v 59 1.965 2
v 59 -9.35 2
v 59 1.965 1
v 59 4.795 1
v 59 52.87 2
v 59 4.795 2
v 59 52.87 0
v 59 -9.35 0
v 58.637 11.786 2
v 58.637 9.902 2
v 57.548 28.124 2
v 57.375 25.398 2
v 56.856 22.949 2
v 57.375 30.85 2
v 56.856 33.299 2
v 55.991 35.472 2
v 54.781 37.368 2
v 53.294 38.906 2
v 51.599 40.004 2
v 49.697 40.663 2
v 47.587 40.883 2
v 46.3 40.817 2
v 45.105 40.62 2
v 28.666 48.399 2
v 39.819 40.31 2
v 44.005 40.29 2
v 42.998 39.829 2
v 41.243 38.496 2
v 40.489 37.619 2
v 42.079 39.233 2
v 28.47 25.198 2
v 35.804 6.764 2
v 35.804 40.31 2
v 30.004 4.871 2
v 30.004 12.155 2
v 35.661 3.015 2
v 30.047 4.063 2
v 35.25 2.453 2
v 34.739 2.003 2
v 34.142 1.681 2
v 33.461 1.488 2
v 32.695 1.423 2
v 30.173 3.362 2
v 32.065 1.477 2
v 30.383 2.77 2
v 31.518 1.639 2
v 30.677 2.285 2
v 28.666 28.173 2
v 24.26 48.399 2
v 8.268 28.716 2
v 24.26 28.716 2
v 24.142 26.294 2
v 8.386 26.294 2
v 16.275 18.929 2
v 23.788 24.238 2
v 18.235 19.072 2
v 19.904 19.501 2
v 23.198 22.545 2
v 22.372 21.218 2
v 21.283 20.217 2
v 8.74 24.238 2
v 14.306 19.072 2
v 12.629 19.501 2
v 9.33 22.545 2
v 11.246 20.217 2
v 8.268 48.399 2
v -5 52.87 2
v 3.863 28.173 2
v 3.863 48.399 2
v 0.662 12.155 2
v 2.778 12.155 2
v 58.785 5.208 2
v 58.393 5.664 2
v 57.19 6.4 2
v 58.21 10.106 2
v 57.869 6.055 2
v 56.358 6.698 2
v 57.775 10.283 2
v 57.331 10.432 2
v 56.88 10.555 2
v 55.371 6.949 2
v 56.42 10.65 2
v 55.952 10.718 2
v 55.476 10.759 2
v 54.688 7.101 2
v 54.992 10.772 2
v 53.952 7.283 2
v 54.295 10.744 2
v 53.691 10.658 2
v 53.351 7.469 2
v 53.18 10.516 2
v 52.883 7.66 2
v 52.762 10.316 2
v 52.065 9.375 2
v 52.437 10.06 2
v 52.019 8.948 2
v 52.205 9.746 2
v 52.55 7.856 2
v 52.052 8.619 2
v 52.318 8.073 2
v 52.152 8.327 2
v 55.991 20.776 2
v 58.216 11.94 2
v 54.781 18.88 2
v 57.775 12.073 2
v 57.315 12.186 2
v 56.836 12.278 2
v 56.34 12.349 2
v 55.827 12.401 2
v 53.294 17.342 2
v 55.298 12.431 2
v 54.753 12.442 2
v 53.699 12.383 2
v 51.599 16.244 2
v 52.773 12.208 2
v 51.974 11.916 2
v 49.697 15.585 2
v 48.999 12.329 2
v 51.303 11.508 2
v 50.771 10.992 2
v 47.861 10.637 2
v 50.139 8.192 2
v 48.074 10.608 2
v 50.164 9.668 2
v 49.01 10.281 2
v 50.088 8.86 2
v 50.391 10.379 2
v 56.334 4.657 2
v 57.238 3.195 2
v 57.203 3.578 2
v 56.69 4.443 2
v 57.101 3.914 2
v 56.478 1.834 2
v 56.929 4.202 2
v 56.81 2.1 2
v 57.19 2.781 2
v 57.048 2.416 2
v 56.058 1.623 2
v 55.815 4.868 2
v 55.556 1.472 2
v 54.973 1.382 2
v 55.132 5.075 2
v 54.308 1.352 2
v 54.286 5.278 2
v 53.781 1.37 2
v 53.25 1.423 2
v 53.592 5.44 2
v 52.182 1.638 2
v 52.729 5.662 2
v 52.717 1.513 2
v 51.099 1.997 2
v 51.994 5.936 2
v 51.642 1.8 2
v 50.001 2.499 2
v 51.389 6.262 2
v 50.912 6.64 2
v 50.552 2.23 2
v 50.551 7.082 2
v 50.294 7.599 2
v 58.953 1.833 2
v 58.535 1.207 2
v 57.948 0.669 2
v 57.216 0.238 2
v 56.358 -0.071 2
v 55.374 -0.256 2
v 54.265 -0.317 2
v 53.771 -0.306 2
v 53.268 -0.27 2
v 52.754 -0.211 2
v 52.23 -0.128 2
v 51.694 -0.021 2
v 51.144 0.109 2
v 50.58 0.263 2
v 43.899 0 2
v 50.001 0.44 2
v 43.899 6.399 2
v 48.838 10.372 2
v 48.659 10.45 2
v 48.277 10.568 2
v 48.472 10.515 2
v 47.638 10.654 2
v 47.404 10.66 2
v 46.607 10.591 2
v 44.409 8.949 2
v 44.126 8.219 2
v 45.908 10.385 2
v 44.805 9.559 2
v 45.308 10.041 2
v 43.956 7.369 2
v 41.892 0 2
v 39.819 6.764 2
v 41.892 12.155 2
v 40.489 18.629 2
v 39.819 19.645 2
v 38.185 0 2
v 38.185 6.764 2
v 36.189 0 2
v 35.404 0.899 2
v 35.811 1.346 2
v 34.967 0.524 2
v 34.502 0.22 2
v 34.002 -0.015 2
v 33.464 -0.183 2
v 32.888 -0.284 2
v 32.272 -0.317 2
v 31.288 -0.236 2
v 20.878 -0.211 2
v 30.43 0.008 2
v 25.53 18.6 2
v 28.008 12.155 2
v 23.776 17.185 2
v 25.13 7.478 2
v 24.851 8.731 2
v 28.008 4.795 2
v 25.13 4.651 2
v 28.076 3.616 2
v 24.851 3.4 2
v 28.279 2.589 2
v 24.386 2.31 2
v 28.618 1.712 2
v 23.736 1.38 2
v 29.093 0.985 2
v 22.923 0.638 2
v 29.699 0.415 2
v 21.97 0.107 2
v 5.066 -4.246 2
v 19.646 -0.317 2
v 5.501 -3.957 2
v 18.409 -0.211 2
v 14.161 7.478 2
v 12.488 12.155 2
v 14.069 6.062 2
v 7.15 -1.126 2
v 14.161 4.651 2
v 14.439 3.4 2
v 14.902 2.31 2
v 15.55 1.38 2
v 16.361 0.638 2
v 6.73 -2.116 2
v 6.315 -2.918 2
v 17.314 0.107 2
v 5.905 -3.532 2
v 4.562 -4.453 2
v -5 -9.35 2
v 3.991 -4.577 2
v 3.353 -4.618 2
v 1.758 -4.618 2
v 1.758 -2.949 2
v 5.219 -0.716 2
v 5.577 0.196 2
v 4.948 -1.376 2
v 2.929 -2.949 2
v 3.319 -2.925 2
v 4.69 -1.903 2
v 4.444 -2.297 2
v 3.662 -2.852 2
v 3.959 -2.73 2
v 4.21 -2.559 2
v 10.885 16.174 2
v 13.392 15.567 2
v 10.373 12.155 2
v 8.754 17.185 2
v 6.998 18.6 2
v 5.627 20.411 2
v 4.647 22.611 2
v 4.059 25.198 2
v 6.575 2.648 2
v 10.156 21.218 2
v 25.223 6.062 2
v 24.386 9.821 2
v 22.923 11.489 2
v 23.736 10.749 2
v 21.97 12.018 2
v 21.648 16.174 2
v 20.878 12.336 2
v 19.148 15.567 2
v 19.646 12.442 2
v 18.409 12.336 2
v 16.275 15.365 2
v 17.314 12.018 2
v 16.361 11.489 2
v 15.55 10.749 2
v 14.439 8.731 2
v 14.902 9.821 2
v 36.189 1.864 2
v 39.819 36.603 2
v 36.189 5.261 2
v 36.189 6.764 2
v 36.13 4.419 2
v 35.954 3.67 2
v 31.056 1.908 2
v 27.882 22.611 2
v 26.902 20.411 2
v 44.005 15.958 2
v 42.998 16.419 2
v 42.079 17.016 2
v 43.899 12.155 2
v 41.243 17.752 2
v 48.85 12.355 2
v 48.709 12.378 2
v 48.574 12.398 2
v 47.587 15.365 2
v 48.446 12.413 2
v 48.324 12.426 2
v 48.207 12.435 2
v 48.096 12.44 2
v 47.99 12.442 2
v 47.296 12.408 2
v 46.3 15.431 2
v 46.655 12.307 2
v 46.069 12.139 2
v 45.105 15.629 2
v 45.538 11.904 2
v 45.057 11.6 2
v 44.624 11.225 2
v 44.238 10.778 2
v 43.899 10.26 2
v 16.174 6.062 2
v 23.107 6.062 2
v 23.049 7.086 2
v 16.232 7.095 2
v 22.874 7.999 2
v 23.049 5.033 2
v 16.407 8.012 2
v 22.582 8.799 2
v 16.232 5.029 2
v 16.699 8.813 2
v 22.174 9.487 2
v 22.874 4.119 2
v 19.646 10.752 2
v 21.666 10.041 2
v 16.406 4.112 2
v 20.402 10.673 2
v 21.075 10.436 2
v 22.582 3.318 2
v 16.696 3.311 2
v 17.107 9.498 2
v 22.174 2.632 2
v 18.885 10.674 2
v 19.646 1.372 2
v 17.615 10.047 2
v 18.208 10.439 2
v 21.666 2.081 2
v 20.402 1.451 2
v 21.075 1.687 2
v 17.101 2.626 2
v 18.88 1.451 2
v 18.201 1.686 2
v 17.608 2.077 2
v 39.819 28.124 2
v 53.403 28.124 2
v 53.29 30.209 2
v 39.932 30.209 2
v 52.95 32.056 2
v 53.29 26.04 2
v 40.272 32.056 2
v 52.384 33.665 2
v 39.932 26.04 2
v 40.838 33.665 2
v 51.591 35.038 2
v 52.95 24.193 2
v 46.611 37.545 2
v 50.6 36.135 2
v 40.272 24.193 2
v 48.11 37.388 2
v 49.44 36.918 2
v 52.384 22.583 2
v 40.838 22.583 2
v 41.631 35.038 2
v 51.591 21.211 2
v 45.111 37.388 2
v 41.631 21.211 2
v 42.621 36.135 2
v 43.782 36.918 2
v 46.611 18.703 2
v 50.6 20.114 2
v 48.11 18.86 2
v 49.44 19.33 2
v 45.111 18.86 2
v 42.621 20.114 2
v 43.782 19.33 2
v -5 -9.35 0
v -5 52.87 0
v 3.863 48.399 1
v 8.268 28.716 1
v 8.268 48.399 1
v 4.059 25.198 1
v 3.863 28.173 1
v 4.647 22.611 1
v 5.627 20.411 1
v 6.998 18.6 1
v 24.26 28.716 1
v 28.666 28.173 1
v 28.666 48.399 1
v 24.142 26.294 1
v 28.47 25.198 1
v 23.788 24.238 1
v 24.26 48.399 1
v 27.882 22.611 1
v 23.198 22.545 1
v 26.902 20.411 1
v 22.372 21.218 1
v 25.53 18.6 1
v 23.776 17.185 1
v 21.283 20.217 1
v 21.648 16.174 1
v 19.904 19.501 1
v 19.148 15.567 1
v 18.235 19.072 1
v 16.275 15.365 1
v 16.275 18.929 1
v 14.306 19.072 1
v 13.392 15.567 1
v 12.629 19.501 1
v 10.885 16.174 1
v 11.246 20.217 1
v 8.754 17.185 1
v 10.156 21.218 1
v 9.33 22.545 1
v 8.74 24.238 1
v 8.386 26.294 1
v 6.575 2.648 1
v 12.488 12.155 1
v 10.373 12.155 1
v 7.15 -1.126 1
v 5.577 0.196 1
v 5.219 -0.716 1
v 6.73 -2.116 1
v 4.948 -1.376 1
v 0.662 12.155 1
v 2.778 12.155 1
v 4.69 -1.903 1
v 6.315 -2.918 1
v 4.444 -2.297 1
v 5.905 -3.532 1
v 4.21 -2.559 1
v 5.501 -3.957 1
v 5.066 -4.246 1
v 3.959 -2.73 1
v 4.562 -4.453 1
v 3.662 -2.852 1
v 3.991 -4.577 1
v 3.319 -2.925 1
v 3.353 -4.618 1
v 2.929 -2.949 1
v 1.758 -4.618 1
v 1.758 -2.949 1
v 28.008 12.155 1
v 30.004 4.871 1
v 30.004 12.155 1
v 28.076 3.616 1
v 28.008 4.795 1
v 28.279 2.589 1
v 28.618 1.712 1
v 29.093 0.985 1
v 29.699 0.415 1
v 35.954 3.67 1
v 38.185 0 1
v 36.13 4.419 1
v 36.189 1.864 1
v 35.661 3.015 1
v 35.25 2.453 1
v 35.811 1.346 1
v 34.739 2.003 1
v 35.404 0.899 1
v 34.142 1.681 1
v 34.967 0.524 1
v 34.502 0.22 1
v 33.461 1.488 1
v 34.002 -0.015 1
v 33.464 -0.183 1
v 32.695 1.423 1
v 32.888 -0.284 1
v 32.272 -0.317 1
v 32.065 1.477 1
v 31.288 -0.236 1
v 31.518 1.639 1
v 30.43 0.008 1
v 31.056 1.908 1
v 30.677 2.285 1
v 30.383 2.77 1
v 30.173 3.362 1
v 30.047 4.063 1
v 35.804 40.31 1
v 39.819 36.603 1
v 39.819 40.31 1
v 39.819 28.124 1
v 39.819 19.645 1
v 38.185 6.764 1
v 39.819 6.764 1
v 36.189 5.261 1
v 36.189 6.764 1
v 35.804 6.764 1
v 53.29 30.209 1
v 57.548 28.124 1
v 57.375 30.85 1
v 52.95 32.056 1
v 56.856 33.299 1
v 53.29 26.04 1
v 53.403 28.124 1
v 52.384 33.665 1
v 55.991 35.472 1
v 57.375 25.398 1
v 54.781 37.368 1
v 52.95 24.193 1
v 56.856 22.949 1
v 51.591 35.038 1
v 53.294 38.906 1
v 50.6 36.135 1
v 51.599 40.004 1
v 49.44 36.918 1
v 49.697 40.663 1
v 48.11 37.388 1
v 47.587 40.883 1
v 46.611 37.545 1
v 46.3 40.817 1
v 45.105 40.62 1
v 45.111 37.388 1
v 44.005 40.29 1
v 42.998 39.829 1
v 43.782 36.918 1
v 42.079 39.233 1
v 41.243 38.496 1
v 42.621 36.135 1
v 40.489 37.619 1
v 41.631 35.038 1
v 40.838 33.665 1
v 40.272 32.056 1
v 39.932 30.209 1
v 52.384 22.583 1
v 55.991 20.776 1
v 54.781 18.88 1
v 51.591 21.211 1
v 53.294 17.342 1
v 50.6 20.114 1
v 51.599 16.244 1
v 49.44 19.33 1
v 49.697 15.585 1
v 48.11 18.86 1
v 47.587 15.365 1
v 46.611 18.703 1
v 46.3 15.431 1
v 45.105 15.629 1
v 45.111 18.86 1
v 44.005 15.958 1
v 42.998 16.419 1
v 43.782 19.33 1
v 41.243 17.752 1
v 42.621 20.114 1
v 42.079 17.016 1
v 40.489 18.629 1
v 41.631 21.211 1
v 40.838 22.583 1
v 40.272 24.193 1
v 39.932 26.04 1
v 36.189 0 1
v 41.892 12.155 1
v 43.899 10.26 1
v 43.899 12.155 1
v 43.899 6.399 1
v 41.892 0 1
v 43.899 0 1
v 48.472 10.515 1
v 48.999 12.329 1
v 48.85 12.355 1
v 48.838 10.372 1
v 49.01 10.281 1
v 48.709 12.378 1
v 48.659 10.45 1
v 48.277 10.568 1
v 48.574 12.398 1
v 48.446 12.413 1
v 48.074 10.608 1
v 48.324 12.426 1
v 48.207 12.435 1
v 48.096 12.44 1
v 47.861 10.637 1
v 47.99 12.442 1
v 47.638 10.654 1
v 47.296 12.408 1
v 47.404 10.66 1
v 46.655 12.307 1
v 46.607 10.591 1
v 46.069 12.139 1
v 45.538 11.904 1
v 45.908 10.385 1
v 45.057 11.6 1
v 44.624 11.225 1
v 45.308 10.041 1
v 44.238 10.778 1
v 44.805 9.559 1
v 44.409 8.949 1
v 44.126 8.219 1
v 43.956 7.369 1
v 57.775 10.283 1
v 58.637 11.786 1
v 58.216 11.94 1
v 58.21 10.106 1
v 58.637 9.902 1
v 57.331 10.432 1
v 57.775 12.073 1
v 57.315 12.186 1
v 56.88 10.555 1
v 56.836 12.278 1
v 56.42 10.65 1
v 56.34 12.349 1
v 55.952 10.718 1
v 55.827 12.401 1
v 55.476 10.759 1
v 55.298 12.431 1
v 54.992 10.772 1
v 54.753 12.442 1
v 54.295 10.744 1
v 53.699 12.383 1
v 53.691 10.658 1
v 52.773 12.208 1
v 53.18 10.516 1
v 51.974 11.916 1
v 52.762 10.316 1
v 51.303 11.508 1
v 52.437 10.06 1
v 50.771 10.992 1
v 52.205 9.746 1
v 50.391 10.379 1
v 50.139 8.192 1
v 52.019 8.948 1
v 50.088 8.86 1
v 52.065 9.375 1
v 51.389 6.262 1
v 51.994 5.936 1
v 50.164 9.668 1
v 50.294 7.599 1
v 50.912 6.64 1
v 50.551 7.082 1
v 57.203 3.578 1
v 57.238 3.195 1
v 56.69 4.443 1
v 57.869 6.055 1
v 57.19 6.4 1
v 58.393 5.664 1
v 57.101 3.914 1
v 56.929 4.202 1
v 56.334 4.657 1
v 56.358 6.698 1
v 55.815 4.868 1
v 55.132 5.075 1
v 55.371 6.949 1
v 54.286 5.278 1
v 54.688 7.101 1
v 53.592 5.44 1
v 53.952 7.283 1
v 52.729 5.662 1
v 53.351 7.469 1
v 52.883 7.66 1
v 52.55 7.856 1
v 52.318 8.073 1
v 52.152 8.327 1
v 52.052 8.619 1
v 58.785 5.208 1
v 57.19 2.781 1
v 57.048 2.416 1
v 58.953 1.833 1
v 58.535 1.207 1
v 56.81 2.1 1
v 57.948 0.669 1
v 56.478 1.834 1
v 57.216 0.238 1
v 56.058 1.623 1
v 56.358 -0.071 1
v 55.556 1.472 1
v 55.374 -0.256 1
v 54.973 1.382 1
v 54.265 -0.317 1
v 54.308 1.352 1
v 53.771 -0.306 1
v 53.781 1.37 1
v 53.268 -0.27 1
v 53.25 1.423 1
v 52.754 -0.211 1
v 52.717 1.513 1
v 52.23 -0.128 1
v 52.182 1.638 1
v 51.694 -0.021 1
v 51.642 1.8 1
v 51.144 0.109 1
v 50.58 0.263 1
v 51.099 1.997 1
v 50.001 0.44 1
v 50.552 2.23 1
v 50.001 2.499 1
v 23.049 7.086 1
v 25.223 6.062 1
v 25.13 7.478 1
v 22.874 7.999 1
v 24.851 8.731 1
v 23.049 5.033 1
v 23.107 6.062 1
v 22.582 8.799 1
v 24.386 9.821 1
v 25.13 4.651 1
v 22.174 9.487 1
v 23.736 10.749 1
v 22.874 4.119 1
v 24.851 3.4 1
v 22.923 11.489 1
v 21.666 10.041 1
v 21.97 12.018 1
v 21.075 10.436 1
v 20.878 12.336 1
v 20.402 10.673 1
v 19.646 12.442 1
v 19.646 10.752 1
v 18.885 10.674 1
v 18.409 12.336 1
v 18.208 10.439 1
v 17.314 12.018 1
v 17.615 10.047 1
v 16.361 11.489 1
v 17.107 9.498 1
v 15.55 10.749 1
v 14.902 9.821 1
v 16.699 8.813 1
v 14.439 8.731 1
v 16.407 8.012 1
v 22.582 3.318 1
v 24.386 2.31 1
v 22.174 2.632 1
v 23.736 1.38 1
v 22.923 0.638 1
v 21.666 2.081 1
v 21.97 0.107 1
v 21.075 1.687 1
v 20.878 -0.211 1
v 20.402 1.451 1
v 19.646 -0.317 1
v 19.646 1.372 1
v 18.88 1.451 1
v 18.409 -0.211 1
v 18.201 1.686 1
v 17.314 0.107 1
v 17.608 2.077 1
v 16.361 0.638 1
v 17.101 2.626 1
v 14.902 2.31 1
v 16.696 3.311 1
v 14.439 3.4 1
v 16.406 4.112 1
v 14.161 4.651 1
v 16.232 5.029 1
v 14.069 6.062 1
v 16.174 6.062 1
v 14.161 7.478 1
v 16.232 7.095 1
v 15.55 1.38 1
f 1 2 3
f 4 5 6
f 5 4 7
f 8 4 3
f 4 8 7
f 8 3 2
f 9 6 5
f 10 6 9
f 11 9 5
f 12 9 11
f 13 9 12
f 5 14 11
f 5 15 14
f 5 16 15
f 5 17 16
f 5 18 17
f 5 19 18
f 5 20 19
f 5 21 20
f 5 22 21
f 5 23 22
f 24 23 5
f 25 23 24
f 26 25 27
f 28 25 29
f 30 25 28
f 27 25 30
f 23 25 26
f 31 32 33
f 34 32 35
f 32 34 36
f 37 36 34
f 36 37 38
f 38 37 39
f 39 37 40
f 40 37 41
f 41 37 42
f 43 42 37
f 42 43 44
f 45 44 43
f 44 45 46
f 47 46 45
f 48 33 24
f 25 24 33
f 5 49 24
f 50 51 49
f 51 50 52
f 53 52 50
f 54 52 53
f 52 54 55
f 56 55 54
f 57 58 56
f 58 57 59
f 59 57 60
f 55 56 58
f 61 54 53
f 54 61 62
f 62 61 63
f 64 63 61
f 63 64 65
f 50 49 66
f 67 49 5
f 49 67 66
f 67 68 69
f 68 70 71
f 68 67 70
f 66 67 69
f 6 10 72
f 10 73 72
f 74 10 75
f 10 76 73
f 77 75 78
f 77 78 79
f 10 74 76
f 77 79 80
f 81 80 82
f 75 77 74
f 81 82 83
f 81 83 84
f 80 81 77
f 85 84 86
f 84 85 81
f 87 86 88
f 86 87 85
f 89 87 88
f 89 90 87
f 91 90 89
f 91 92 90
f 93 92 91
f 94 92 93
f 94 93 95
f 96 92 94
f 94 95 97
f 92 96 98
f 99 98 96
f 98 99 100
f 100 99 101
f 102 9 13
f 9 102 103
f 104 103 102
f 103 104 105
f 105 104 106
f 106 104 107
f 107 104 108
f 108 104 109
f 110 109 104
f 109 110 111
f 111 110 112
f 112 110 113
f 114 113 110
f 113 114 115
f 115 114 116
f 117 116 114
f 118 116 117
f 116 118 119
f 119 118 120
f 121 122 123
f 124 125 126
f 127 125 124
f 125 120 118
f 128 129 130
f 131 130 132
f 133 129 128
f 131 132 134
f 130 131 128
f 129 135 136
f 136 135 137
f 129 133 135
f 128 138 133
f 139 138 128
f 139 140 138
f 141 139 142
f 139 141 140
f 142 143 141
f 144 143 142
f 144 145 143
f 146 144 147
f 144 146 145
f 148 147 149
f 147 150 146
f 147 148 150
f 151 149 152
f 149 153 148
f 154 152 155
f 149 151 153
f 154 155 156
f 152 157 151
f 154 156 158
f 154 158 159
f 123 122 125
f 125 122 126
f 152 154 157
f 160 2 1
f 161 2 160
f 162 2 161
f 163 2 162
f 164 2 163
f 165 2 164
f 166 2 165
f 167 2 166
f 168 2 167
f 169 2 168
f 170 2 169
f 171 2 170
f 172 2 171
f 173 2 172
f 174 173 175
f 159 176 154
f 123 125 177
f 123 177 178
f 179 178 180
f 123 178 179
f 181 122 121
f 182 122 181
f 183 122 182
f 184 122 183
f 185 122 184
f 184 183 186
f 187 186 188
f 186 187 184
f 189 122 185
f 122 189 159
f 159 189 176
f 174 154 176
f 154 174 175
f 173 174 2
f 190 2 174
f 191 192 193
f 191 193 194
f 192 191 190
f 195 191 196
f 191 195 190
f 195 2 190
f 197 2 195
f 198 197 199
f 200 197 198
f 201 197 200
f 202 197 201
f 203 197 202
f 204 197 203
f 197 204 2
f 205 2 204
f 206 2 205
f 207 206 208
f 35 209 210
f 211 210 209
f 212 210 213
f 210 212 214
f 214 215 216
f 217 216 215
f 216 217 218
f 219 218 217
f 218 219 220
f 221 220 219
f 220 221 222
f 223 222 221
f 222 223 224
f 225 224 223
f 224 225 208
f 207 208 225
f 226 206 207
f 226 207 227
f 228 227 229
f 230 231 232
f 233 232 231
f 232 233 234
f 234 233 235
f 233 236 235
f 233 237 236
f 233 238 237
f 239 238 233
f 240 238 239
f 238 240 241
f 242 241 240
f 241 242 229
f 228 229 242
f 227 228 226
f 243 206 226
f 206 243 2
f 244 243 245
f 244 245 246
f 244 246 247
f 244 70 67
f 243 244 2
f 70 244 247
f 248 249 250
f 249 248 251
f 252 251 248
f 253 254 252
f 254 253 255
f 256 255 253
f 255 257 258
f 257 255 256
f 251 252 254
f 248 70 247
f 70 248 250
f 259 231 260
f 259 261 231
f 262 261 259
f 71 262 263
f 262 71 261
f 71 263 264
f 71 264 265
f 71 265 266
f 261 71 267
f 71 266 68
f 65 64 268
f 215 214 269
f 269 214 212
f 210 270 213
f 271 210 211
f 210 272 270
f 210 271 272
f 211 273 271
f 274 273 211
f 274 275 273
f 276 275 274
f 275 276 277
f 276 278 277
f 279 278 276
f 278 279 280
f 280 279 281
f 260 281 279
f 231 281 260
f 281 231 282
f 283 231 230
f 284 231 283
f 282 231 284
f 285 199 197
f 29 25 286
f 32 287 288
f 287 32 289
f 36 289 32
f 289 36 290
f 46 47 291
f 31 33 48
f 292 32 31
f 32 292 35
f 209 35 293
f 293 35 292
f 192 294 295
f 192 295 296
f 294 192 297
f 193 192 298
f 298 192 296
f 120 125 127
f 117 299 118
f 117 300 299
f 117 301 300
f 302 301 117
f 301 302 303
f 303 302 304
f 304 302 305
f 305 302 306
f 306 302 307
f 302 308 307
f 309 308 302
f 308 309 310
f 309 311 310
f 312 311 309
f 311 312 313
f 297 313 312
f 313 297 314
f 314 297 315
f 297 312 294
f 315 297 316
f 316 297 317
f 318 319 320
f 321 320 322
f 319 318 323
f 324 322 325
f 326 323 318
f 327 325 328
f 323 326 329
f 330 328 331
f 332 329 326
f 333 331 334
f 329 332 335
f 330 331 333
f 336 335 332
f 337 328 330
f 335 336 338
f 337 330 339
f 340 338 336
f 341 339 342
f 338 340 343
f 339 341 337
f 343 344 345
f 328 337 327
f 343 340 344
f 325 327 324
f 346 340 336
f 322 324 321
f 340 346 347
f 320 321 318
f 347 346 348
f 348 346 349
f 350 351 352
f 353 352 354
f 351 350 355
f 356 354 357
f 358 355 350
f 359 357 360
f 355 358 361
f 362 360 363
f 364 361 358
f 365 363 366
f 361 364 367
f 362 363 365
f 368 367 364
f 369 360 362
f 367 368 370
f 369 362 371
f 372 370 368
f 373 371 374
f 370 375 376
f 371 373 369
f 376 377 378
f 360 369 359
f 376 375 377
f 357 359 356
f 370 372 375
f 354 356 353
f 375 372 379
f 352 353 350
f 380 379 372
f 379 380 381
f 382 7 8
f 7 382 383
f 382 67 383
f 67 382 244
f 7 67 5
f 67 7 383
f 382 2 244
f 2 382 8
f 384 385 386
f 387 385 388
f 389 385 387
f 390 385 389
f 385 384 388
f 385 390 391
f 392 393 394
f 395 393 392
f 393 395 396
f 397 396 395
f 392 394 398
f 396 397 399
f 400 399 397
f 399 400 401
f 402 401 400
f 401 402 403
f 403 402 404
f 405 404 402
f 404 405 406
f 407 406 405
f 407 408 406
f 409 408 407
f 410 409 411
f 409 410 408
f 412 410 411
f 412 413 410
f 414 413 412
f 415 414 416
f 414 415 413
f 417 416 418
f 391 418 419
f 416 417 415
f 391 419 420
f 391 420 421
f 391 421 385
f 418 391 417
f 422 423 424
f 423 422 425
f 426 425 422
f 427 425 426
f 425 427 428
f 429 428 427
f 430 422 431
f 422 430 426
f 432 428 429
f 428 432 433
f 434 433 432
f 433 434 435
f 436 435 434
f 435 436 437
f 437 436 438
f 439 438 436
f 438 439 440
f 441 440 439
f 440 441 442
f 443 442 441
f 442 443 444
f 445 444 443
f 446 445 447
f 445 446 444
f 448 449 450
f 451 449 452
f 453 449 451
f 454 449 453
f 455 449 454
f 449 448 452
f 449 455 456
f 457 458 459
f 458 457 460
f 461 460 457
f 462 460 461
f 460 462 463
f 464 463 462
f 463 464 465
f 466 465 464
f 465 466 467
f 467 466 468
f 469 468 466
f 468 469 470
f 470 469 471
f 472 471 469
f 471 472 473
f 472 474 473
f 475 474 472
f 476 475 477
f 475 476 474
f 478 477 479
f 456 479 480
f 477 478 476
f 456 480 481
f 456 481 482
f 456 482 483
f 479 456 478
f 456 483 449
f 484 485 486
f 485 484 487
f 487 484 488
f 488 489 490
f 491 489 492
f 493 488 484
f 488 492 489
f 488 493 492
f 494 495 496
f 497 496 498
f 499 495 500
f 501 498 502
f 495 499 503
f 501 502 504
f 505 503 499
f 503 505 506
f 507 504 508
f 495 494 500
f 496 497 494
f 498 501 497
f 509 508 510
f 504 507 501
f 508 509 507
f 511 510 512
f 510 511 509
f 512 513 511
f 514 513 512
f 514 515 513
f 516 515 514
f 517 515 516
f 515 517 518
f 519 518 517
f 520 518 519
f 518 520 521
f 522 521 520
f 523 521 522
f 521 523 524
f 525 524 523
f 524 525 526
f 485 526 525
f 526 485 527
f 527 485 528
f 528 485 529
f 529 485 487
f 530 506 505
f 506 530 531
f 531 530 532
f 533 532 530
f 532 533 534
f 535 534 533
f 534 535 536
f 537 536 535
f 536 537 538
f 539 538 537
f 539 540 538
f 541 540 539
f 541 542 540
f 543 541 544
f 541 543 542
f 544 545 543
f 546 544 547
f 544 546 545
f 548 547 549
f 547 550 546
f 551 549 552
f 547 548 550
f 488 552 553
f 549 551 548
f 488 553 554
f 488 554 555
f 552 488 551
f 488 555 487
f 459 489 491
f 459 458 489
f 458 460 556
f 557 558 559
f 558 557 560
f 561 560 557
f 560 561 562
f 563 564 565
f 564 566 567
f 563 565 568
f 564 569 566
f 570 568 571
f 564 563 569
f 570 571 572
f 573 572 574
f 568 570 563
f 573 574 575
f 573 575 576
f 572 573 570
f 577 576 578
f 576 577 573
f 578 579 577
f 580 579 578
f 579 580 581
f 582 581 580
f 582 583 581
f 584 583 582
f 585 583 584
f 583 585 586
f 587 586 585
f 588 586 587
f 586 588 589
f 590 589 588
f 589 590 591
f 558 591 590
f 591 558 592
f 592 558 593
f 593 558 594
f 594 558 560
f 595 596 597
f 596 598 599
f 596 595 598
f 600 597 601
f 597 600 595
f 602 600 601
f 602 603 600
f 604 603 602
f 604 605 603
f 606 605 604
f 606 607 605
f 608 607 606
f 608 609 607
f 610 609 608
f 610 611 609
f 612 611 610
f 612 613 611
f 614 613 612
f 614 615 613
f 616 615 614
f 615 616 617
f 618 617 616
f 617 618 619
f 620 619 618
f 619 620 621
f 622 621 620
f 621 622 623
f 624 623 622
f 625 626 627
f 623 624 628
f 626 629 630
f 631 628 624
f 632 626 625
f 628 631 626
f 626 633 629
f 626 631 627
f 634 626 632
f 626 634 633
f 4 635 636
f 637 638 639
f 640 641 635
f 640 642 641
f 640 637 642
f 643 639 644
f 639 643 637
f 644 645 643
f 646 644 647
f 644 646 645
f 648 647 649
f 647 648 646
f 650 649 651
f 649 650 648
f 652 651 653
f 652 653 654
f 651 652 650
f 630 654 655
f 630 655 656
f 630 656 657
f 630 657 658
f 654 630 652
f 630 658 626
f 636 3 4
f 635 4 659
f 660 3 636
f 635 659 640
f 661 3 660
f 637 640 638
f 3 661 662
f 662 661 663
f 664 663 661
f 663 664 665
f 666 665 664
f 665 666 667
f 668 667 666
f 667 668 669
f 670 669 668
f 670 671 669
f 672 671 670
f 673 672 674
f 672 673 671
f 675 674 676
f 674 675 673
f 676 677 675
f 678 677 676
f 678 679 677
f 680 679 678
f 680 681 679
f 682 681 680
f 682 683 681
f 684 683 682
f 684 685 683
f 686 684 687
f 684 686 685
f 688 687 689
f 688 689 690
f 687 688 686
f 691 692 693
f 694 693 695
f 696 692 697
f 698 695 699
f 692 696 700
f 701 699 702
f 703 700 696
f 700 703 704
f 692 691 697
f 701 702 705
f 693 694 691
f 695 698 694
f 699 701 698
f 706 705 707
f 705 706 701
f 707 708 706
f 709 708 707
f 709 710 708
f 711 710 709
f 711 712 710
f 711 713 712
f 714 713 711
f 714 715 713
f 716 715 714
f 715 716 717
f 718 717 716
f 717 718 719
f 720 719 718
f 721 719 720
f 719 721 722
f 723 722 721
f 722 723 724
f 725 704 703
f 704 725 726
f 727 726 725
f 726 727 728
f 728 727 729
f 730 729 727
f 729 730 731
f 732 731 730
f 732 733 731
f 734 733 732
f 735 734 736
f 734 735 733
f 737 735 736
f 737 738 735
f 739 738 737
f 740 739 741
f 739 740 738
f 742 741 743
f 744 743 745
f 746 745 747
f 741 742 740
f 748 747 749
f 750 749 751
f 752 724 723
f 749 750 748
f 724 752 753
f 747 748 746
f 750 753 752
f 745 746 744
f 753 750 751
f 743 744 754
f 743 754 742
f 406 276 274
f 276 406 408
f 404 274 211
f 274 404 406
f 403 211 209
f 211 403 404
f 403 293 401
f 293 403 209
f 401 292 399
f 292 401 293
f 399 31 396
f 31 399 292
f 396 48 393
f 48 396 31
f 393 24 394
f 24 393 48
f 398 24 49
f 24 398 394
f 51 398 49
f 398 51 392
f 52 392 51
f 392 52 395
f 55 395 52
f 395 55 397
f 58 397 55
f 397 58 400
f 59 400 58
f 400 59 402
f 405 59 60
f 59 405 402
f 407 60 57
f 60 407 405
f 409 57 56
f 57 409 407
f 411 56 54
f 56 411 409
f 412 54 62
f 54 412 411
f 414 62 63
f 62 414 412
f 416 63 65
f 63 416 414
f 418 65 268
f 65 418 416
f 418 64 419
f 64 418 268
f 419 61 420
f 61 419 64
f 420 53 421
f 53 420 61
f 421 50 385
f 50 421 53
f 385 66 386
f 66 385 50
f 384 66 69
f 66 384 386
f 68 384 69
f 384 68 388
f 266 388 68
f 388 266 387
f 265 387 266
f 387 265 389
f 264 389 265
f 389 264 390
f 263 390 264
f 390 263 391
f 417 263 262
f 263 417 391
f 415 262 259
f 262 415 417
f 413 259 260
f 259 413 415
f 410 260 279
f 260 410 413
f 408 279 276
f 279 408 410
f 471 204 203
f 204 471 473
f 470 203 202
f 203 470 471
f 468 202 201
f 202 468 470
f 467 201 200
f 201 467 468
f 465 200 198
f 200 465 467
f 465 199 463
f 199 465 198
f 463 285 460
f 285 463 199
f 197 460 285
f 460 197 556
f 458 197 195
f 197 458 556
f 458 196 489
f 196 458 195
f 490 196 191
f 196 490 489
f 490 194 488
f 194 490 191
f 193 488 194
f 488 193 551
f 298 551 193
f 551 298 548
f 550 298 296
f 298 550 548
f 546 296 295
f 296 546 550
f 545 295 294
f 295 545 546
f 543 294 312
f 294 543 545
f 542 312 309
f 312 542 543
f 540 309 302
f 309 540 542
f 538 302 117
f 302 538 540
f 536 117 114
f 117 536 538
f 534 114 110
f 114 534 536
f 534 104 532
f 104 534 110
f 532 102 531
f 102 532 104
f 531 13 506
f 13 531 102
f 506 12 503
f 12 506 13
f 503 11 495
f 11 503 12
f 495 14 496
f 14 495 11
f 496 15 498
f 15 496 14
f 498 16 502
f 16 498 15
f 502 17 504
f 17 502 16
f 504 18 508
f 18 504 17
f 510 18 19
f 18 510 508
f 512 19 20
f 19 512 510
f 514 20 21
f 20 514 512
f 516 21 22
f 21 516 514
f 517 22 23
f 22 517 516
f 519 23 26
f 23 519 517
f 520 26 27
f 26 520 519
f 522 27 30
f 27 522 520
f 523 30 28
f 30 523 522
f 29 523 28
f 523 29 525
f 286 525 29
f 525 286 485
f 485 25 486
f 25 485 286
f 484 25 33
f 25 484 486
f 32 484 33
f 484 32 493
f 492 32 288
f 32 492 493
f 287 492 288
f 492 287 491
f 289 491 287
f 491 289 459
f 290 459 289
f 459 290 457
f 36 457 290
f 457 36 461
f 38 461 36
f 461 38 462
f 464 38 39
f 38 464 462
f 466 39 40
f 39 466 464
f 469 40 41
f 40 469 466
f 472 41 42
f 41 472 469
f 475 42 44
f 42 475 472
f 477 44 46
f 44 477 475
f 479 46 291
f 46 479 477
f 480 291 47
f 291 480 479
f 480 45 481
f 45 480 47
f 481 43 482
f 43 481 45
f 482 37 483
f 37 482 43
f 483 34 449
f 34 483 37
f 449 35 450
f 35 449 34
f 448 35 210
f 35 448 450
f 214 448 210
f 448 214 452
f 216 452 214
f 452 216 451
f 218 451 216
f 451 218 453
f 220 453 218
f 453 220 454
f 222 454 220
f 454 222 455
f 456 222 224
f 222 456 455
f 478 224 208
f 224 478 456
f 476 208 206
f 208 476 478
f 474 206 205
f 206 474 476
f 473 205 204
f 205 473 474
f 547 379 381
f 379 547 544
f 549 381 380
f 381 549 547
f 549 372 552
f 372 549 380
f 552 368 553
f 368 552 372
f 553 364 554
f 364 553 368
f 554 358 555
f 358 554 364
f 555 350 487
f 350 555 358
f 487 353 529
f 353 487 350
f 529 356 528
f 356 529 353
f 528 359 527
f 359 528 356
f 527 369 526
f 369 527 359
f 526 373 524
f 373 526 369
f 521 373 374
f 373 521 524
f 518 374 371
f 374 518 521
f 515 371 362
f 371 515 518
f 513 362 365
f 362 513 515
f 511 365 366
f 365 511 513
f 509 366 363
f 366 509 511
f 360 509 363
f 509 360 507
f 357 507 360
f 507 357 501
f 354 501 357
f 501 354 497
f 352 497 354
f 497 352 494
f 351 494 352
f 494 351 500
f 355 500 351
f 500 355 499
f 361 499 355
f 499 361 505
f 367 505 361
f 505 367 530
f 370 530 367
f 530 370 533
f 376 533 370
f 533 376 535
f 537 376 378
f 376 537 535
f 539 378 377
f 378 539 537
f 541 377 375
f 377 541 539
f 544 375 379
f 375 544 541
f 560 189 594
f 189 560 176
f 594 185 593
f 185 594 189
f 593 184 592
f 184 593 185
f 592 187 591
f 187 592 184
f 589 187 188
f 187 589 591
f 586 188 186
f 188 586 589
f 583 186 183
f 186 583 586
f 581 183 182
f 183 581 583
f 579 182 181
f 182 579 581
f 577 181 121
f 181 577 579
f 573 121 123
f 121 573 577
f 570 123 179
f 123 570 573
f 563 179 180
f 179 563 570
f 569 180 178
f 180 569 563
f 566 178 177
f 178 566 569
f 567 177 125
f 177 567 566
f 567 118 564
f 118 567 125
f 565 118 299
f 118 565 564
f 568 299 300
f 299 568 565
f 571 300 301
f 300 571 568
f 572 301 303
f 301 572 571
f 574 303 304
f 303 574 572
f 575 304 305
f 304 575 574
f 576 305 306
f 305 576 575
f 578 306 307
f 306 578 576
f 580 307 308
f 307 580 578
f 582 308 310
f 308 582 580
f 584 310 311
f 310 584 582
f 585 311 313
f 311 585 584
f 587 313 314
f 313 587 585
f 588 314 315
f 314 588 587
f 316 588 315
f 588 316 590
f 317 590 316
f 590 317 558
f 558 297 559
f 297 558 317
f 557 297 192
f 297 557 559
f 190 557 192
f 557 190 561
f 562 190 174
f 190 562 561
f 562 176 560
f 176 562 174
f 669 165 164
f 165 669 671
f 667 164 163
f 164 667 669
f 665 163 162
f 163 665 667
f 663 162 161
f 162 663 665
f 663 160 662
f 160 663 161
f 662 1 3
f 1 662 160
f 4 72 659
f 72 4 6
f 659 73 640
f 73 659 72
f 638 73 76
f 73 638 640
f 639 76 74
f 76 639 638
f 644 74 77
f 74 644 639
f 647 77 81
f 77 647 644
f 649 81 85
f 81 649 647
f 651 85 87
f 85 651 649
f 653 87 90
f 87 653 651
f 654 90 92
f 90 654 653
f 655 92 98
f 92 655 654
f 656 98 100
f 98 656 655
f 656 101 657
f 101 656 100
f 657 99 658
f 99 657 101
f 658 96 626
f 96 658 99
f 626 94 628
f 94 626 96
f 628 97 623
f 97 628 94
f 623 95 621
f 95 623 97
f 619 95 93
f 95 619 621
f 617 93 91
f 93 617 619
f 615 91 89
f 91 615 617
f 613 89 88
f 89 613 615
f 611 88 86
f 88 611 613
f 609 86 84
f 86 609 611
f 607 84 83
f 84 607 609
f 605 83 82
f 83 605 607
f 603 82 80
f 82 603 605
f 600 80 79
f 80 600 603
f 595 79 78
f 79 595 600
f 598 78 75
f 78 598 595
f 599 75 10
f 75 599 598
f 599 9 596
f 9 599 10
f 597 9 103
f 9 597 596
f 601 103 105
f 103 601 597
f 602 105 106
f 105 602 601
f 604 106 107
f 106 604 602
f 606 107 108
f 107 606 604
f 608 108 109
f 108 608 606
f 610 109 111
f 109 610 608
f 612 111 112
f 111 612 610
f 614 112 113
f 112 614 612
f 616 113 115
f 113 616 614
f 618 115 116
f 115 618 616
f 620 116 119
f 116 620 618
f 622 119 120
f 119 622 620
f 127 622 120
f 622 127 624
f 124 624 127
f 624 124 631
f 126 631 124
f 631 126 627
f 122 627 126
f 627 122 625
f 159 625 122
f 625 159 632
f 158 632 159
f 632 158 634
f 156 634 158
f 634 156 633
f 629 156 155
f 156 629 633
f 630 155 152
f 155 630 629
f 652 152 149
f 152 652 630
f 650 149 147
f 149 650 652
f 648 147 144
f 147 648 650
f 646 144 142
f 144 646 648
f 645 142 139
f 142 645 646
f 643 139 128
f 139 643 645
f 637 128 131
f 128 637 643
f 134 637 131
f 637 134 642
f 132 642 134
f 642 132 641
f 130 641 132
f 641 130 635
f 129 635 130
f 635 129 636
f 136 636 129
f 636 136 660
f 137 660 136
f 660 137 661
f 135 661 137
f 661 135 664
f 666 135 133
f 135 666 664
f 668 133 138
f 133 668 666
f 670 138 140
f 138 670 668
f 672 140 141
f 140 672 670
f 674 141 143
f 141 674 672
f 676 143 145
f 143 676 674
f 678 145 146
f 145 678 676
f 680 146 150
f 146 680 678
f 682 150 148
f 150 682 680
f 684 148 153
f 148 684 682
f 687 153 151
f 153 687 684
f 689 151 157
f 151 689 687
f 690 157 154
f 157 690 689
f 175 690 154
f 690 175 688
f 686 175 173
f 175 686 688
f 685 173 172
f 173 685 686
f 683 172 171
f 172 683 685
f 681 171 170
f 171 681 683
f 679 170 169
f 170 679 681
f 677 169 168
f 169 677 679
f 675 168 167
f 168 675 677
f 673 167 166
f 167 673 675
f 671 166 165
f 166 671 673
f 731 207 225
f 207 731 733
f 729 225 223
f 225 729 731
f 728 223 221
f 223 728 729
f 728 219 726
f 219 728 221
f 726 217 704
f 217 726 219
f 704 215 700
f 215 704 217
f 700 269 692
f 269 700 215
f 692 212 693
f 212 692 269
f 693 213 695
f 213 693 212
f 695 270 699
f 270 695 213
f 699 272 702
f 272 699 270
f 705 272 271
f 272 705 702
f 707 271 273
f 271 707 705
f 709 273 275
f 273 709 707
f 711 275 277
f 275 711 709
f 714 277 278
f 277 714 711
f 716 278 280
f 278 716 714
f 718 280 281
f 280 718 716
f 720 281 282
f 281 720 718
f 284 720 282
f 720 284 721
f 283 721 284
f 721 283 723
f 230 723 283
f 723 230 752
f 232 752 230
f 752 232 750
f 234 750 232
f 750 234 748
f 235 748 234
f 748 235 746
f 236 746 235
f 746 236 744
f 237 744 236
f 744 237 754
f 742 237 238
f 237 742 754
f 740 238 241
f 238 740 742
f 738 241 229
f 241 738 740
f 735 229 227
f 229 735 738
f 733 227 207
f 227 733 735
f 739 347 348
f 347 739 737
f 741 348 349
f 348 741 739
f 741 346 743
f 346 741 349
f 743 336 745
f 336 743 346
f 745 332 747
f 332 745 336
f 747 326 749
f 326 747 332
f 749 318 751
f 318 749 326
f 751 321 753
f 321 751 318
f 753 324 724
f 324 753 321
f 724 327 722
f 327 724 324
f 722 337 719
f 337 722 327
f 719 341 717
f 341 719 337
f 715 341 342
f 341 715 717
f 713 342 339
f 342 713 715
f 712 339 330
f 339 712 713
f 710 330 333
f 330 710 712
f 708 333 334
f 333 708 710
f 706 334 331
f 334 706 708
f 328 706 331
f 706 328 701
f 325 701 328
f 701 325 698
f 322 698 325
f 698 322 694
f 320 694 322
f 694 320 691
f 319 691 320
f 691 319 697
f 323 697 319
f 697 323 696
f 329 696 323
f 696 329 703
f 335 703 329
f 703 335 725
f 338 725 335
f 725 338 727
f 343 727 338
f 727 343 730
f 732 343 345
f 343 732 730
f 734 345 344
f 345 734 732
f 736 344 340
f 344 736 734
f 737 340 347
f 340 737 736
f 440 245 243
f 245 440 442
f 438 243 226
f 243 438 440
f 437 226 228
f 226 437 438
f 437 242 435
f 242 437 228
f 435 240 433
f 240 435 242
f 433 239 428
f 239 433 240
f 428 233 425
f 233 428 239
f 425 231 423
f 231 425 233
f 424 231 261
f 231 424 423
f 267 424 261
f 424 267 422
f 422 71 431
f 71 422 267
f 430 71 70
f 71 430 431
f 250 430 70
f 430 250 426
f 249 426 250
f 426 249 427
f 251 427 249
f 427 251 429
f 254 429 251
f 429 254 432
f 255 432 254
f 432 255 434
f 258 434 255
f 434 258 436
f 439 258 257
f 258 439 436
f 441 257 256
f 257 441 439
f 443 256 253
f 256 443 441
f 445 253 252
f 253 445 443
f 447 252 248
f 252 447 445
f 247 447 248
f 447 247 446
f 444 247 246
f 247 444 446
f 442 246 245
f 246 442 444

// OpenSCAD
// -*- mode: SCAD ; c-file-style: "ellemtel" ; coding: utf-8 -*-
//
// Rudolf Koch's reply to requests for free samples of his work, translated
// to English
//
// (c) 2017 Roland Sieker <ospalh@gmail.com>
// Licence: CC-BY-SA 4.0


ms = 0.01;
// Muggeseggele (gnat's bollocks, in Swabian about as harmless as the
// phrase shown)

schwabacher = "Alte Schwabacher:style=Regular";

//
breite = 54;
tiefe = 52.22;
xo = 0 + breite/2;
yo = -4.35 + tiefe/2;

rand = 5;
hw = 2;  // Halter weite
hh = 0.5;

// swabian_greatings(1); // unconnected
// positive_greating();
negative_greating();
//quick_greating();

module positive_greating()
{
   plate(1);
   translate([0,0,1])
   {
      swabian_greatings(1);
   }
}

module negative_greating()
{
   difference()
   {
      plate(2);
      translate([0,0,1])
      {
         swabian_greatings(1+ms);
      }
   }
}

module quick_greating()
{
   connectors();
   swabian_greatings(1+hh);
}



module swabian_greatings(h)
{
   linear_extrude(h)
   {
      translate([0, 16])
      {
         text("Up", font=schwabacher, size=32);
      }
      translate([0, 0])
      {
         text("yours!", font=schwabacher, size=16);
      }

   }
}


module plate(h)
{
   translate([xo,yo,h/2])
   {
      cube([breite+2*rand, tiefe+2*rand, h], center=true);
   }
}


module connectors()
{

   module wH(x, y, l)
   {
      // waagerechter Halter
      translate([x, y, hh/2])
      {
         cube([l, hw, hh], center=true);
      }
   }
   module sH(x, y, l)
   {
      // senkrechter Halter
      translate([x, y, hh/2])
      {
         cube([hw, l, hh], center=true);
      }
   }
   module dH(x, y, l)
   {
      // diagonaler Halter
      translate([x, y, hh/2])
      {
         rotate(-45)
         {
            cube([hw, l, hh], center=true);
         }
      }
   }
   module qH(x, y, l)
   {
      // diagonaler Halter (quer)
      translate([x, y, hh/2])
      {
         rotate(-45)
         {
            cube([l, hw, hh], center=true);
         }
      }
   }
   module xH(x, y, l, a)
   {
      // schraeger Halter
      translate([x, y, hh/2])
      {
         rotate(a)
         {
            cube([l, hw, hh], center=true);
         }
      }
   }

}
